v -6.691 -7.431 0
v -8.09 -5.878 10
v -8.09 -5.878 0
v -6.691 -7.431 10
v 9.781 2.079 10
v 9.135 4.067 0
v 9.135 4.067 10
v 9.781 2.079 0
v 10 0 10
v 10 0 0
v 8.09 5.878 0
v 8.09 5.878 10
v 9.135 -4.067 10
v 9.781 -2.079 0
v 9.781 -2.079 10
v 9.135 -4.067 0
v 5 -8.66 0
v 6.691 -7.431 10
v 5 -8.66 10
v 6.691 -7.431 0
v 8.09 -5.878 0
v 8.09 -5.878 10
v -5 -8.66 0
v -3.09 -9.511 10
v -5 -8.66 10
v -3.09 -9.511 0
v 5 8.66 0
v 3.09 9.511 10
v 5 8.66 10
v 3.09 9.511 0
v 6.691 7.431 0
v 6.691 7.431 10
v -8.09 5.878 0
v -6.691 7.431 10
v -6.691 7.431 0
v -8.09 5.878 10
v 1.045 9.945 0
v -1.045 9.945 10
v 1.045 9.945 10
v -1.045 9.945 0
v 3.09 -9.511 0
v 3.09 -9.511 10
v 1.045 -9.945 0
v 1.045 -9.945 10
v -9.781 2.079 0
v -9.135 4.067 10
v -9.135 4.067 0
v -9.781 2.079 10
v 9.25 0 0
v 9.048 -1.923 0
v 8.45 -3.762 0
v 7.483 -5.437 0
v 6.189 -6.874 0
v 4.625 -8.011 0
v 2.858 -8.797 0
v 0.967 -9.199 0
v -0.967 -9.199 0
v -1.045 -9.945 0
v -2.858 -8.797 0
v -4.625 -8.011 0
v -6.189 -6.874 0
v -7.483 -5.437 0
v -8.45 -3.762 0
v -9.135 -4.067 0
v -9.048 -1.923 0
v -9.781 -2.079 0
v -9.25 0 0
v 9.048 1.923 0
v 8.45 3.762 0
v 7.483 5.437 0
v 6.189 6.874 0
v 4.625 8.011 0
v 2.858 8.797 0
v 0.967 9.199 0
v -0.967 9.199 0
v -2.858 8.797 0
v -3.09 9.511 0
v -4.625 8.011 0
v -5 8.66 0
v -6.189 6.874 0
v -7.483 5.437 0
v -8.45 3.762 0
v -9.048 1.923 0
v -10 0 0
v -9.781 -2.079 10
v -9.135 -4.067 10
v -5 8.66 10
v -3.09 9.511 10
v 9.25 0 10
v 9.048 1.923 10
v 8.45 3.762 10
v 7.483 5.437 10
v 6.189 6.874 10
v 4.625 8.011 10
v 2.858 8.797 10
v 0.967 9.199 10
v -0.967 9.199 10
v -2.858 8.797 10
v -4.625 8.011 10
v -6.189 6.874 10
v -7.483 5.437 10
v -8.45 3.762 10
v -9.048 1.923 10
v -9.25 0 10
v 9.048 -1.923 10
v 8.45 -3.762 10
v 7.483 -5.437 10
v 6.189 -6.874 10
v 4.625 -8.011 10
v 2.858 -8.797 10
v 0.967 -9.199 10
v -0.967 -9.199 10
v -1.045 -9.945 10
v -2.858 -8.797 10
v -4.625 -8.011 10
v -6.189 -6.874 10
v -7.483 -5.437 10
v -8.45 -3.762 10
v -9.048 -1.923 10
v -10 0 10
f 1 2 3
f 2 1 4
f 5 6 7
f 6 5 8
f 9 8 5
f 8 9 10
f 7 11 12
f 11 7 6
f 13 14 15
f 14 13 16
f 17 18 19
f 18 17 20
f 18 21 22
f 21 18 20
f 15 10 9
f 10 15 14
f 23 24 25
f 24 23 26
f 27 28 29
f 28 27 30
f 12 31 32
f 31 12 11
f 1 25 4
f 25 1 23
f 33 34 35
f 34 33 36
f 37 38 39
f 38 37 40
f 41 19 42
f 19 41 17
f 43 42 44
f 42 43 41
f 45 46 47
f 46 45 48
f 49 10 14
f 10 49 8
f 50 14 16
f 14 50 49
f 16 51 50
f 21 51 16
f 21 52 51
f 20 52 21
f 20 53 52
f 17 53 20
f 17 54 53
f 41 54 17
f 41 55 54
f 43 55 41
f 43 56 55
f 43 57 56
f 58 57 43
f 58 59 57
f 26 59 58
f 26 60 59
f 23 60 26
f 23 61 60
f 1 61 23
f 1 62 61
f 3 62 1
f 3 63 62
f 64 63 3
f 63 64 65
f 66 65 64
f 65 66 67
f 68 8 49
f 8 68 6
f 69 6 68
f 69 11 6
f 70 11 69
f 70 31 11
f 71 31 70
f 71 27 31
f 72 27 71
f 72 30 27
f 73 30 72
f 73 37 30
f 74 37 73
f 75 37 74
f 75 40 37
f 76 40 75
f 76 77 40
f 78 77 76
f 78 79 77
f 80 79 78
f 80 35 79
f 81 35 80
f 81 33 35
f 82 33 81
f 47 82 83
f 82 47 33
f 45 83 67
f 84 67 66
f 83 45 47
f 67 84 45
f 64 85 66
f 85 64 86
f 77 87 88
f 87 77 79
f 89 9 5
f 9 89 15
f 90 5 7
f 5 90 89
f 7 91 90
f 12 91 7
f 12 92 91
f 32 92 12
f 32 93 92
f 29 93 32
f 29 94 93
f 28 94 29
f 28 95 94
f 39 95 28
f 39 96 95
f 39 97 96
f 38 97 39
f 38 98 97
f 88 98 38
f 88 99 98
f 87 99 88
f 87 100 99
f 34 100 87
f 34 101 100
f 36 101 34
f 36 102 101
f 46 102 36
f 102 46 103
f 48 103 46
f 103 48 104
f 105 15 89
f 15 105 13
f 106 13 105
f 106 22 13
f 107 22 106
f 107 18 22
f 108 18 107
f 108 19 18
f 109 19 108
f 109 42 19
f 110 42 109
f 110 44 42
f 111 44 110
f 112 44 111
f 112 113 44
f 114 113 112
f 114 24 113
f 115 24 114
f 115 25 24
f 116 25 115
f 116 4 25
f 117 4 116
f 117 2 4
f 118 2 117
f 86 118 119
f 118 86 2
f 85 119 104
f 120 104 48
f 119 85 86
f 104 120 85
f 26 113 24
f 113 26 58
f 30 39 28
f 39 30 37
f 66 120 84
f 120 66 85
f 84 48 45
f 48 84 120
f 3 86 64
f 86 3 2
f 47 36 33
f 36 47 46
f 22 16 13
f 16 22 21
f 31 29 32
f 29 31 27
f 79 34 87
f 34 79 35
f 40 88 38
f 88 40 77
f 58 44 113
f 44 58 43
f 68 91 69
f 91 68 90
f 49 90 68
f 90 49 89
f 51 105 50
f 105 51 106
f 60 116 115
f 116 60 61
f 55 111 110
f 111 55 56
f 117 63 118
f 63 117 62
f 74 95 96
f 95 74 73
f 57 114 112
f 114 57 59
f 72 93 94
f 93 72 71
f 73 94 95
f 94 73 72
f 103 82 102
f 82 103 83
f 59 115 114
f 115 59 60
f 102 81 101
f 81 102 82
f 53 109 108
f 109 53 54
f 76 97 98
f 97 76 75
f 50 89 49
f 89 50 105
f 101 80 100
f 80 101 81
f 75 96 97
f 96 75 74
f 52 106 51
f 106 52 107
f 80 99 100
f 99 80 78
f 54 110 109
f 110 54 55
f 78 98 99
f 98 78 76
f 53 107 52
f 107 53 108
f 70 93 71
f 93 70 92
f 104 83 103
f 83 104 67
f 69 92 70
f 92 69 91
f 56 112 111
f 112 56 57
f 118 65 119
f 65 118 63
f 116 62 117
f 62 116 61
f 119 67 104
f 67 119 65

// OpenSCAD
module case() difference() {
    cylinder(r=20/2, h=10);
    translate([0,0,-0.5]) cylinder(r=(20-1.5)/2, h=11);
}

case();
